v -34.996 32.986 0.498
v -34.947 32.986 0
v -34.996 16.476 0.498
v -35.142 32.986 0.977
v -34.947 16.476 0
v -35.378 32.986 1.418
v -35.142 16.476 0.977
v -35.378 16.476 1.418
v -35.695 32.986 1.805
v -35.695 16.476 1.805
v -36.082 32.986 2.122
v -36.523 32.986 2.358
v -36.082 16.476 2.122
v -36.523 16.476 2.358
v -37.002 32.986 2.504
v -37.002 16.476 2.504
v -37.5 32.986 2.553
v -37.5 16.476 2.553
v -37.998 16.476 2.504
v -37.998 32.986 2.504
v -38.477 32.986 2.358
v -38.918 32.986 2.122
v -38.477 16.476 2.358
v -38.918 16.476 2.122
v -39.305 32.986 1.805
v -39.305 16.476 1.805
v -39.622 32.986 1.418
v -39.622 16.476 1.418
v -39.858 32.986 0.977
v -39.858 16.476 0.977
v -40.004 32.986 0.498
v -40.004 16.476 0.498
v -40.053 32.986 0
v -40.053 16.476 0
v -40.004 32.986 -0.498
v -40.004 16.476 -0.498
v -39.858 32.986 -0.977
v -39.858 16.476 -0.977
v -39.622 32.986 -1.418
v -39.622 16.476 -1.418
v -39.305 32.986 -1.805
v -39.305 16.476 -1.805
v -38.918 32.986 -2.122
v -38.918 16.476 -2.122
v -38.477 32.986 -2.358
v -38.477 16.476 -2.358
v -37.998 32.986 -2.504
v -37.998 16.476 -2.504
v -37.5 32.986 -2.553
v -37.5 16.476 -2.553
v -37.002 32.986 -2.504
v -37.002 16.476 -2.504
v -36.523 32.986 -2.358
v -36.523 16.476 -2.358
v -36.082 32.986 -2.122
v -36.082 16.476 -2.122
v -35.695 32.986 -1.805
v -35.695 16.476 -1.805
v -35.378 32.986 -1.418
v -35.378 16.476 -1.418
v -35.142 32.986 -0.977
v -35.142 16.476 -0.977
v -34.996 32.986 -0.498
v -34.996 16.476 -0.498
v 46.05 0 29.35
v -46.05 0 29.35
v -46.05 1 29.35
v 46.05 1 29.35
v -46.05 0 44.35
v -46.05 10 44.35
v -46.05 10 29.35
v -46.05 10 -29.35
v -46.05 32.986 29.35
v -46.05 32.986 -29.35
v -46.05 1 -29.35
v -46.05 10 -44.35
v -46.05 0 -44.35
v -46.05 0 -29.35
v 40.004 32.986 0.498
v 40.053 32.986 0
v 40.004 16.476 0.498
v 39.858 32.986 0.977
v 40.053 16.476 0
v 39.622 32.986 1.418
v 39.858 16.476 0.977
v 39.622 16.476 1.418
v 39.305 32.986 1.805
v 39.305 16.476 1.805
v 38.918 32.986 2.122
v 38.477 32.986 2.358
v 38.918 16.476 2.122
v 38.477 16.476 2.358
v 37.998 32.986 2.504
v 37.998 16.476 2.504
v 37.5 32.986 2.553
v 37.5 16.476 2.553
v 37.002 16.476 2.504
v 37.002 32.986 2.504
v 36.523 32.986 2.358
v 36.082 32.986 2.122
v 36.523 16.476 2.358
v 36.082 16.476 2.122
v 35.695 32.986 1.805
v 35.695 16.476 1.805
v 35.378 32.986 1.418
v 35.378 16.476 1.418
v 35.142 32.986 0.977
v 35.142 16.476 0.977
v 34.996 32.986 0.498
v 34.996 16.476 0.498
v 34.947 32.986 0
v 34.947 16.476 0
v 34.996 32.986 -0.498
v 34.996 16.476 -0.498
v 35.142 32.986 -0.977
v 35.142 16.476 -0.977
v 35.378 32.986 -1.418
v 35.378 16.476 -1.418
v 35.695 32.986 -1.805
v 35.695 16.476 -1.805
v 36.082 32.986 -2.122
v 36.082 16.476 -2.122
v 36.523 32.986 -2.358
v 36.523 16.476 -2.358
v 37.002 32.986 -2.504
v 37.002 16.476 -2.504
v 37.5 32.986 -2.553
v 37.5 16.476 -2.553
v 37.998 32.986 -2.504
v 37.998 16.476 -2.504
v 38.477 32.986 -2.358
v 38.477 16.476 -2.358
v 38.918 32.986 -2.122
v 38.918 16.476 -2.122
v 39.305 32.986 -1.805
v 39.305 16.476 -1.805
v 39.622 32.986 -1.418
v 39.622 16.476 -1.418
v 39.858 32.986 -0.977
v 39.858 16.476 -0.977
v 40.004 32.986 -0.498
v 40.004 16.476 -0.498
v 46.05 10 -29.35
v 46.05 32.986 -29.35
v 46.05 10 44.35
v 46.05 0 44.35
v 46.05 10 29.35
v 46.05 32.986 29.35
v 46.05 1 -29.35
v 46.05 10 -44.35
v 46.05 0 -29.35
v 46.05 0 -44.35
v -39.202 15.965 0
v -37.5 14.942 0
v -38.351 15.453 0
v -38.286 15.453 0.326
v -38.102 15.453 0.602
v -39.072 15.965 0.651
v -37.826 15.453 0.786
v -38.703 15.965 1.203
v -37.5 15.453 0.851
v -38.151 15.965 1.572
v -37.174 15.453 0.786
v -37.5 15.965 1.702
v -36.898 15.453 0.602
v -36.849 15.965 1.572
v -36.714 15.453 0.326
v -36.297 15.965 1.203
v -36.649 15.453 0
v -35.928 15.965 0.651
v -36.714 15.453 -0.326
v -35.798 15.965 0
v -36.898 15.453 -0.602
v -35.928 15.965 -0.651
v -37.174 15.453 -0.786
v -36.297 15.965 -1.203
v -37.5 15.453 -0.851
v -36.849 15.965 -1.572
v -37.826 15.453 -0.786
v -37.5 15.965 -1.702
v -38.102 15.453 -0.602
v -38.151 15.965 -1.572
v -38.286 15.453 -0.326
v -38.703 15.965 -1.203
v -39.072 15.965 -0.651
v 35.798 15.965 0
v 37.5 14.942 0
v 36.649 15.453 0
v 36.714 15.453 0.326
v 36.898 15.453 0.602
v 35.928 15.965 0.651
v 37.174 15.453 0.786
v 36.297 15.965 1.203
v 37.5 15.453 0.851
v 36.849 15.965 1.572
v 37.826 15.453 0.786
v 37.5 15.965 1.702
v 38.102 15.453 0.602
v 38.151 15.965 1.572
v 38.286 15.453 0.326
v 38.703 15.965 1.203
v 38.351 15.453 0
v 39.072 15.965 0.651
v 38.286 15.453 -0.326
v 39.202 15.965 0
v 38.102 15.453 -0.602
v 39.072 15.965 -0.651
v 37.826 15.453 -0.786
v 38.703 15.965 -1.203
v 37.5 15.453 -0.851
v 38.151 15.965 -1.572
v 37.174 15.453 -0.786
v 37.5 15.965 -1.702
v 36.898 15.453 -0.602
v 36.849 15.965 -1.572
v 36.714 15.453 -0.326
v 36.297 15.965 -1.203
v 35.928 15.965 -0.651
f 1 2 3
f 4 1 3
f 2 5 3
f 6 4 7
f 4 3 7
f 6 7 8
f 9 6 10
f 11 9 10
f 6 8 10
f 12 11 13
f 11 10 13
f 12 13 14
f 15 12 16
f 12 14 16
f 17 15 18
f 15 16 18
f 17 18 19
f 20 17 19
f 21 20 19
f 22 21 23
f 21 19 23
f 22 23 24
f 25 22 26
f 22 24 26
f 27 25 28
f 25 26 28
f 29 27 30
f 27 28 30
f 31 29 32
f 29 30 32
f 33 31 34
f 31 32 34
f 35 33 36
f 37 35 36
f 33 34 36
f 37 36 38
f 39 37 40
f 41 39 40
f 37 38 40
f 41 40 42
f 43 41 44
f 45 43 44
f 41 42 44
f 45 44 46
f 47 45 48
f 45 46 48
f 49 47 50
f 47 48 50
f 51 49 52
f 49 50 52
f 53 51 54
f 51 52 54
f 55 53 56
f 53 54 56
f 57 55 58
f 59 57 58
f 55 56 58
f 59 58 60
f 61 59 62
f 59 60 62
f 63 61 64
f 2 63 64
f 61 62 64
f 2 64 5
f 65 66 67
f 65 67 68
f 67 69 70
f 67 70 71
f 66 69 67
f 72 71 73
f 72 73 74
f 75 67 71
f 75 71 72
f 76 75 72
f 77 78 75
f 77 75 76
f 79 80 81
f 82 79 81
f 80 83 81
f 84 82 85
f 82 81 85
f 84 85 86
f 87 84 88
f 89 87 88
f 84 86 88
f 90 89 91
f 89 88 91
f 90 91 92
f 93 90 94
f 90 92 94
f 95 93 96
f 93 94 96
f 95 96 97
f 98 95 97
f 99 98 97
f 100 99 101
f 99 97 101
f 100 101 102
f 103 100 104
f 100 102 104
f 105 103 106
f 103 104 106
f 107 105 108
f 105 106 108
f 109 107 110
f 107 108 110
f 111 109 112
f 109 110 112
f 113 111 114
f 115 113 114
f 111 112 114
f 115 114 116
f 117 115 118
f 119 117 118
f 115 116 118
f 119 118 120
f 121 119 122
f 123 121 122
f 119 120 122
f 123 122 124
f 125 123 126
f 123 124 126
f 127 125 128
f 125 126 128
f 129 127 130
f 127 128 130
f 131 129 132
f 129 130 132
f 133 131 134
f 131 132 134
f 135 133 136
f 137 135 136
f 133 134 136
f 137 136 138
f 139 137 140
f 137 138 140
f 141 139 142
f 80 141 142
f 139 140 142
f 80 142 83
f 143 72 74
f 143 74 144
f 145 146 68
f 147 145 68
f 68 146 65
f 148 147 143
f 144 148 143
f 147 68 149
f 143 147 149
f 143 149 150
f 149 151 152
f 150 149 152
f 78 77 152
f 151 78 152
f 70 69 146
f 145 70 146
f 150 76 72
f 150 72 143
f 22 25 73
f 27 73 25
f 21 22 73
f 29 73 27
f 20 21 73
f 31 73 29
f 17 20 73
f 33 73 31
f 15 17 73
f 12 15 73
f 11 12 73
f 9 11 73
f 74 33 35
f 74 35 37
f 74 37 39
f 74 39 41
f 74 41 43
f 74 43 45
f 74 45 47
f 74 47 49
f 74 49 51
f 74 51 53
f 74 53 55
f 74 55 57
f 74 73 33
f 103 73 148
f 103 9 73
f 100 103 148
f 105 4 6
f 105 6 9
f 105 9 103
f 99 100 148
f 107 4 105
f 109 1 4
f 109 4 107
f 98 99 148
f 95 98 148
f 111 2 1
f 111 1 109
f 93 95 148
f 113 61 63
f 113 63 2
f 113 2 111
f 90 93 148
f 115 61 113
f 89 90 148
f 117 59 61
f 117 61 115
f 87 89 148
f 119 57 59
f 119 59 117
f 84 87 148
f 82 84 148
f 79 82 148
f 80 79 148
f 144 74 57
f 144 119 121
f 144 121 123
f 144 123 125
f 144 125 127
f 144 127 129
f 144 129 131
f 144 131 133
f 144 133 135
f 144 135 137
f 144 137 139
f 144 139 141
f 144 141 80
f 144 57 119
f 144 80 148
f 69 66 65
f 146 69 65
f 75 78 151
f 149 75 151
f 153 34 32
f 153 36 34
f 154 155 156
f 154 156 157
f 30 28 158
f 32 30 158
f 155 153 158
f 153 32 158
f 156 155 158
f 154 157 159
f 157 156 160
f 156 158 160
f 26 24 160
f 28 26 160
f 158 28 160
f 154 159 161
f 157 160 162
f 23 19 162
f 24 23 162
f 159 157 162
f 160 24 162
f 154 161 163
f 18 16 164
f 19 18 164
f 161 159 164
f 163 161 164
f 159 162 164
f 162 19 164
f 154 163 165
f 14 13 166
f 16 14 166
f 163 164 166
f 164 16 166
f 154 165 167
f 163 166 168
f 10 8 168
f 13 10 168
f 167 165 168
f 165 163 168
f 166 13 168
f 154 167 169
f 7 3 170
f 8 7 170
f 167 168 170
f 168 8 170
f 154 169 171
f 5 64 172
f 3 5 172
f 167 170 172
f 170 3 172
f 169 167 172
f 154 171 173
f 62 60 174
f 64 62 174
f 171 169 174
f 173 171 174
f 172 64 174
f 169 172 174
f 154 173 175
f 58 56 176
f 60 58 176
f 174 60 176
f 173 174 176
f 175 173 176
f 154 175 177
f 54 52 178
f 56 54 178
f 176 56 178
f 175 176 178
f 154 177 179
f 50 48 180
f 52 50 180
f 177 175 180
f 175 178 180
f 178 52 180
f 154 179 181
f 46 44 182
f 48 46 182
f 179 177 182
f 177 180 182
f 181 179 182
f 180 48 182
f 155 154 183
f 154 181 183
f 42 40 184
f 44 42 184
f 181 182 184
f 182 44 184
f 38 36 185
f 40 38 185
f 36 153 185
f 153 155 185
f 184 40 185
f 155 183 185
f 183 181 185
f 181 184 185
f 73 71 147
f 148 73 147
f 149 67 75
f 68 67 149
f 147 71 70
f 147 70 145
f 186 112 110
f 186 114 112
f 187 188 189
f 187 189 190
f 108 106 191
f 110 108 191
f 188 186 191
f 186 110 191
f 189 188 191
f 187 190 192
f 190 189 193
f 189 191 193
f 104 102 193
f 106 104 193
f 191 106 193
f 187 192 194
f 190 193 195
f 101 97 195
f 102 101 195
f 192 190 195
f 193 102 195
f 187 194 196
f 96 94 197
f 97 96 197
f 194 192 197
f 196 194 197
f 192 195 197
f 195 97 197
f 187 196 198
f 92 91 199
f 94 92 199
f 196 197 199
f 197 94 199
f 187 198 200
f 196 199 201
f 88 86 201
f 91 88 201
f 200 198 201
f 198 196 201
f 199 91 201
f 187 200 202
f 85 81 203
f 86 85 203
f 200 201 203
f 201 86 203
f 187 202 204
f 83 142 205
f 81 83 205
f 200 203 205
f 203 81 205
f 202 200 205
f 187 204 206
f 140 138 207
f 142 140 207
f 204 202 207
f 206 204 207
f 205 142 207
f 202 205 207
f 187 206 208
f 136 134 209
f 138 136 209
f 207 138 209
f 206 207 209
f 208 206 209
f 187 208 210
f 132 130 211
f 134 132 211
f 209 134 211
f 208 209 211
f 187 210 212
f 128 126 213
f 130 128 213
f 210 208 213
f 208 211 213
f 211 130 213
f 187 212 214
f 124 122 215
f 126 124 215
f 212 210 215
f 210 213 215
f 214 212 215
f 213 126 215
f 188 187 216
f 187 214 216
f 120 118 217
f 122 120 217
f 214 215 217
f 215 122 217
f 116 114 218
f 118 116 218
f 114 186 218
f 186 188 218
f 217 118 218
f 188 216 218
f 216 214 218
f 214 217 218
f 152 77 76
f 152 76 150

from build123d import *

# Parameters (mm, degrees)
SKETCH1_W                   = 92.1
SKETCH1_H                   = 88.7
BOSS_EXTRUDE1_DEPTH         = 10
SKETCH2_W                   = 92.1
SKETCH2_H                   = 58.7
BOSS_EXTRUDE2_DEPTH         = 22.986
SKETCH16_W                  = 92.1
SKETCH16_H                  = 58.7
CUT_EXTRUDE2_DEPTH          = 1
F_1_4_20_TAPPED_HOLE1_D     = 5.1054
F_1_4_20_TAPPED_HOLE1_DEPTH = 16.51
F_1_4_20_TAPPED_HOLE1_TIP   = 1.533816902


with BuildPart() as part:
    # Sketch1 → Boss-Extrude1 (new body)
    with BuildSketch(Plane(origin=(0, 0, 0), x_dir=(1, 0, 0), z_dir=(0, 1, 0))):
        Rectangle(SKETCH1_W, SKETCH1_H)
    extrude(amount=BOSS_EXTRUDE1_DEPTH)

    # Sketch2 → Boss-Extrude2 (add)
    with BuildSketch(Plane(origin=(0, 10, 0), x_dir=(1, 0, 0), z_dir=(0, 1, 0))):
        Rectangle(SKETCH2_W, SKETCH2_H)
    extrude(amount=BOSS_EXTRUDE2_DEPTH)

    # Sketch16 → Cut-Extrude2 (cut)
    with BuildSketch(Plane.XZ):
        Rectangle(SKETCH16_W, SKETCH16_H)
    extrude(amount=-CUT_EXTRUDE2_DEPTH, mode=Mode.SUBTRACT)

    # 1/4-20 Tapped Hole1
    with Locations(Plane(origin=(0, 32.986, 0), x_dir=(-1, 0, 0), z_dir=(0, 1, 0))):
        with Locations((37.5, 0), (-37.5, 0)):
            Hole(F_1_4_20_TAPPED_HOLE1_D / 2, depth=F_1_4_20_TAPPED_HOLE1_DEPTH)
            with Locations((0, 0, -(F_1_4_20_TAPPED_HOLE1_DEPTH + F_1_4_20_TAPPED_HOLE1_TIP / 2))):  # 118° drill point
                Cone(0, F_1_4_20_TAPPED_HOLE1_D / 2, F_1_4_20_TAPPED_HOLE1_TIP, mode=Mode.SUBTRACT)


solid = part.part
